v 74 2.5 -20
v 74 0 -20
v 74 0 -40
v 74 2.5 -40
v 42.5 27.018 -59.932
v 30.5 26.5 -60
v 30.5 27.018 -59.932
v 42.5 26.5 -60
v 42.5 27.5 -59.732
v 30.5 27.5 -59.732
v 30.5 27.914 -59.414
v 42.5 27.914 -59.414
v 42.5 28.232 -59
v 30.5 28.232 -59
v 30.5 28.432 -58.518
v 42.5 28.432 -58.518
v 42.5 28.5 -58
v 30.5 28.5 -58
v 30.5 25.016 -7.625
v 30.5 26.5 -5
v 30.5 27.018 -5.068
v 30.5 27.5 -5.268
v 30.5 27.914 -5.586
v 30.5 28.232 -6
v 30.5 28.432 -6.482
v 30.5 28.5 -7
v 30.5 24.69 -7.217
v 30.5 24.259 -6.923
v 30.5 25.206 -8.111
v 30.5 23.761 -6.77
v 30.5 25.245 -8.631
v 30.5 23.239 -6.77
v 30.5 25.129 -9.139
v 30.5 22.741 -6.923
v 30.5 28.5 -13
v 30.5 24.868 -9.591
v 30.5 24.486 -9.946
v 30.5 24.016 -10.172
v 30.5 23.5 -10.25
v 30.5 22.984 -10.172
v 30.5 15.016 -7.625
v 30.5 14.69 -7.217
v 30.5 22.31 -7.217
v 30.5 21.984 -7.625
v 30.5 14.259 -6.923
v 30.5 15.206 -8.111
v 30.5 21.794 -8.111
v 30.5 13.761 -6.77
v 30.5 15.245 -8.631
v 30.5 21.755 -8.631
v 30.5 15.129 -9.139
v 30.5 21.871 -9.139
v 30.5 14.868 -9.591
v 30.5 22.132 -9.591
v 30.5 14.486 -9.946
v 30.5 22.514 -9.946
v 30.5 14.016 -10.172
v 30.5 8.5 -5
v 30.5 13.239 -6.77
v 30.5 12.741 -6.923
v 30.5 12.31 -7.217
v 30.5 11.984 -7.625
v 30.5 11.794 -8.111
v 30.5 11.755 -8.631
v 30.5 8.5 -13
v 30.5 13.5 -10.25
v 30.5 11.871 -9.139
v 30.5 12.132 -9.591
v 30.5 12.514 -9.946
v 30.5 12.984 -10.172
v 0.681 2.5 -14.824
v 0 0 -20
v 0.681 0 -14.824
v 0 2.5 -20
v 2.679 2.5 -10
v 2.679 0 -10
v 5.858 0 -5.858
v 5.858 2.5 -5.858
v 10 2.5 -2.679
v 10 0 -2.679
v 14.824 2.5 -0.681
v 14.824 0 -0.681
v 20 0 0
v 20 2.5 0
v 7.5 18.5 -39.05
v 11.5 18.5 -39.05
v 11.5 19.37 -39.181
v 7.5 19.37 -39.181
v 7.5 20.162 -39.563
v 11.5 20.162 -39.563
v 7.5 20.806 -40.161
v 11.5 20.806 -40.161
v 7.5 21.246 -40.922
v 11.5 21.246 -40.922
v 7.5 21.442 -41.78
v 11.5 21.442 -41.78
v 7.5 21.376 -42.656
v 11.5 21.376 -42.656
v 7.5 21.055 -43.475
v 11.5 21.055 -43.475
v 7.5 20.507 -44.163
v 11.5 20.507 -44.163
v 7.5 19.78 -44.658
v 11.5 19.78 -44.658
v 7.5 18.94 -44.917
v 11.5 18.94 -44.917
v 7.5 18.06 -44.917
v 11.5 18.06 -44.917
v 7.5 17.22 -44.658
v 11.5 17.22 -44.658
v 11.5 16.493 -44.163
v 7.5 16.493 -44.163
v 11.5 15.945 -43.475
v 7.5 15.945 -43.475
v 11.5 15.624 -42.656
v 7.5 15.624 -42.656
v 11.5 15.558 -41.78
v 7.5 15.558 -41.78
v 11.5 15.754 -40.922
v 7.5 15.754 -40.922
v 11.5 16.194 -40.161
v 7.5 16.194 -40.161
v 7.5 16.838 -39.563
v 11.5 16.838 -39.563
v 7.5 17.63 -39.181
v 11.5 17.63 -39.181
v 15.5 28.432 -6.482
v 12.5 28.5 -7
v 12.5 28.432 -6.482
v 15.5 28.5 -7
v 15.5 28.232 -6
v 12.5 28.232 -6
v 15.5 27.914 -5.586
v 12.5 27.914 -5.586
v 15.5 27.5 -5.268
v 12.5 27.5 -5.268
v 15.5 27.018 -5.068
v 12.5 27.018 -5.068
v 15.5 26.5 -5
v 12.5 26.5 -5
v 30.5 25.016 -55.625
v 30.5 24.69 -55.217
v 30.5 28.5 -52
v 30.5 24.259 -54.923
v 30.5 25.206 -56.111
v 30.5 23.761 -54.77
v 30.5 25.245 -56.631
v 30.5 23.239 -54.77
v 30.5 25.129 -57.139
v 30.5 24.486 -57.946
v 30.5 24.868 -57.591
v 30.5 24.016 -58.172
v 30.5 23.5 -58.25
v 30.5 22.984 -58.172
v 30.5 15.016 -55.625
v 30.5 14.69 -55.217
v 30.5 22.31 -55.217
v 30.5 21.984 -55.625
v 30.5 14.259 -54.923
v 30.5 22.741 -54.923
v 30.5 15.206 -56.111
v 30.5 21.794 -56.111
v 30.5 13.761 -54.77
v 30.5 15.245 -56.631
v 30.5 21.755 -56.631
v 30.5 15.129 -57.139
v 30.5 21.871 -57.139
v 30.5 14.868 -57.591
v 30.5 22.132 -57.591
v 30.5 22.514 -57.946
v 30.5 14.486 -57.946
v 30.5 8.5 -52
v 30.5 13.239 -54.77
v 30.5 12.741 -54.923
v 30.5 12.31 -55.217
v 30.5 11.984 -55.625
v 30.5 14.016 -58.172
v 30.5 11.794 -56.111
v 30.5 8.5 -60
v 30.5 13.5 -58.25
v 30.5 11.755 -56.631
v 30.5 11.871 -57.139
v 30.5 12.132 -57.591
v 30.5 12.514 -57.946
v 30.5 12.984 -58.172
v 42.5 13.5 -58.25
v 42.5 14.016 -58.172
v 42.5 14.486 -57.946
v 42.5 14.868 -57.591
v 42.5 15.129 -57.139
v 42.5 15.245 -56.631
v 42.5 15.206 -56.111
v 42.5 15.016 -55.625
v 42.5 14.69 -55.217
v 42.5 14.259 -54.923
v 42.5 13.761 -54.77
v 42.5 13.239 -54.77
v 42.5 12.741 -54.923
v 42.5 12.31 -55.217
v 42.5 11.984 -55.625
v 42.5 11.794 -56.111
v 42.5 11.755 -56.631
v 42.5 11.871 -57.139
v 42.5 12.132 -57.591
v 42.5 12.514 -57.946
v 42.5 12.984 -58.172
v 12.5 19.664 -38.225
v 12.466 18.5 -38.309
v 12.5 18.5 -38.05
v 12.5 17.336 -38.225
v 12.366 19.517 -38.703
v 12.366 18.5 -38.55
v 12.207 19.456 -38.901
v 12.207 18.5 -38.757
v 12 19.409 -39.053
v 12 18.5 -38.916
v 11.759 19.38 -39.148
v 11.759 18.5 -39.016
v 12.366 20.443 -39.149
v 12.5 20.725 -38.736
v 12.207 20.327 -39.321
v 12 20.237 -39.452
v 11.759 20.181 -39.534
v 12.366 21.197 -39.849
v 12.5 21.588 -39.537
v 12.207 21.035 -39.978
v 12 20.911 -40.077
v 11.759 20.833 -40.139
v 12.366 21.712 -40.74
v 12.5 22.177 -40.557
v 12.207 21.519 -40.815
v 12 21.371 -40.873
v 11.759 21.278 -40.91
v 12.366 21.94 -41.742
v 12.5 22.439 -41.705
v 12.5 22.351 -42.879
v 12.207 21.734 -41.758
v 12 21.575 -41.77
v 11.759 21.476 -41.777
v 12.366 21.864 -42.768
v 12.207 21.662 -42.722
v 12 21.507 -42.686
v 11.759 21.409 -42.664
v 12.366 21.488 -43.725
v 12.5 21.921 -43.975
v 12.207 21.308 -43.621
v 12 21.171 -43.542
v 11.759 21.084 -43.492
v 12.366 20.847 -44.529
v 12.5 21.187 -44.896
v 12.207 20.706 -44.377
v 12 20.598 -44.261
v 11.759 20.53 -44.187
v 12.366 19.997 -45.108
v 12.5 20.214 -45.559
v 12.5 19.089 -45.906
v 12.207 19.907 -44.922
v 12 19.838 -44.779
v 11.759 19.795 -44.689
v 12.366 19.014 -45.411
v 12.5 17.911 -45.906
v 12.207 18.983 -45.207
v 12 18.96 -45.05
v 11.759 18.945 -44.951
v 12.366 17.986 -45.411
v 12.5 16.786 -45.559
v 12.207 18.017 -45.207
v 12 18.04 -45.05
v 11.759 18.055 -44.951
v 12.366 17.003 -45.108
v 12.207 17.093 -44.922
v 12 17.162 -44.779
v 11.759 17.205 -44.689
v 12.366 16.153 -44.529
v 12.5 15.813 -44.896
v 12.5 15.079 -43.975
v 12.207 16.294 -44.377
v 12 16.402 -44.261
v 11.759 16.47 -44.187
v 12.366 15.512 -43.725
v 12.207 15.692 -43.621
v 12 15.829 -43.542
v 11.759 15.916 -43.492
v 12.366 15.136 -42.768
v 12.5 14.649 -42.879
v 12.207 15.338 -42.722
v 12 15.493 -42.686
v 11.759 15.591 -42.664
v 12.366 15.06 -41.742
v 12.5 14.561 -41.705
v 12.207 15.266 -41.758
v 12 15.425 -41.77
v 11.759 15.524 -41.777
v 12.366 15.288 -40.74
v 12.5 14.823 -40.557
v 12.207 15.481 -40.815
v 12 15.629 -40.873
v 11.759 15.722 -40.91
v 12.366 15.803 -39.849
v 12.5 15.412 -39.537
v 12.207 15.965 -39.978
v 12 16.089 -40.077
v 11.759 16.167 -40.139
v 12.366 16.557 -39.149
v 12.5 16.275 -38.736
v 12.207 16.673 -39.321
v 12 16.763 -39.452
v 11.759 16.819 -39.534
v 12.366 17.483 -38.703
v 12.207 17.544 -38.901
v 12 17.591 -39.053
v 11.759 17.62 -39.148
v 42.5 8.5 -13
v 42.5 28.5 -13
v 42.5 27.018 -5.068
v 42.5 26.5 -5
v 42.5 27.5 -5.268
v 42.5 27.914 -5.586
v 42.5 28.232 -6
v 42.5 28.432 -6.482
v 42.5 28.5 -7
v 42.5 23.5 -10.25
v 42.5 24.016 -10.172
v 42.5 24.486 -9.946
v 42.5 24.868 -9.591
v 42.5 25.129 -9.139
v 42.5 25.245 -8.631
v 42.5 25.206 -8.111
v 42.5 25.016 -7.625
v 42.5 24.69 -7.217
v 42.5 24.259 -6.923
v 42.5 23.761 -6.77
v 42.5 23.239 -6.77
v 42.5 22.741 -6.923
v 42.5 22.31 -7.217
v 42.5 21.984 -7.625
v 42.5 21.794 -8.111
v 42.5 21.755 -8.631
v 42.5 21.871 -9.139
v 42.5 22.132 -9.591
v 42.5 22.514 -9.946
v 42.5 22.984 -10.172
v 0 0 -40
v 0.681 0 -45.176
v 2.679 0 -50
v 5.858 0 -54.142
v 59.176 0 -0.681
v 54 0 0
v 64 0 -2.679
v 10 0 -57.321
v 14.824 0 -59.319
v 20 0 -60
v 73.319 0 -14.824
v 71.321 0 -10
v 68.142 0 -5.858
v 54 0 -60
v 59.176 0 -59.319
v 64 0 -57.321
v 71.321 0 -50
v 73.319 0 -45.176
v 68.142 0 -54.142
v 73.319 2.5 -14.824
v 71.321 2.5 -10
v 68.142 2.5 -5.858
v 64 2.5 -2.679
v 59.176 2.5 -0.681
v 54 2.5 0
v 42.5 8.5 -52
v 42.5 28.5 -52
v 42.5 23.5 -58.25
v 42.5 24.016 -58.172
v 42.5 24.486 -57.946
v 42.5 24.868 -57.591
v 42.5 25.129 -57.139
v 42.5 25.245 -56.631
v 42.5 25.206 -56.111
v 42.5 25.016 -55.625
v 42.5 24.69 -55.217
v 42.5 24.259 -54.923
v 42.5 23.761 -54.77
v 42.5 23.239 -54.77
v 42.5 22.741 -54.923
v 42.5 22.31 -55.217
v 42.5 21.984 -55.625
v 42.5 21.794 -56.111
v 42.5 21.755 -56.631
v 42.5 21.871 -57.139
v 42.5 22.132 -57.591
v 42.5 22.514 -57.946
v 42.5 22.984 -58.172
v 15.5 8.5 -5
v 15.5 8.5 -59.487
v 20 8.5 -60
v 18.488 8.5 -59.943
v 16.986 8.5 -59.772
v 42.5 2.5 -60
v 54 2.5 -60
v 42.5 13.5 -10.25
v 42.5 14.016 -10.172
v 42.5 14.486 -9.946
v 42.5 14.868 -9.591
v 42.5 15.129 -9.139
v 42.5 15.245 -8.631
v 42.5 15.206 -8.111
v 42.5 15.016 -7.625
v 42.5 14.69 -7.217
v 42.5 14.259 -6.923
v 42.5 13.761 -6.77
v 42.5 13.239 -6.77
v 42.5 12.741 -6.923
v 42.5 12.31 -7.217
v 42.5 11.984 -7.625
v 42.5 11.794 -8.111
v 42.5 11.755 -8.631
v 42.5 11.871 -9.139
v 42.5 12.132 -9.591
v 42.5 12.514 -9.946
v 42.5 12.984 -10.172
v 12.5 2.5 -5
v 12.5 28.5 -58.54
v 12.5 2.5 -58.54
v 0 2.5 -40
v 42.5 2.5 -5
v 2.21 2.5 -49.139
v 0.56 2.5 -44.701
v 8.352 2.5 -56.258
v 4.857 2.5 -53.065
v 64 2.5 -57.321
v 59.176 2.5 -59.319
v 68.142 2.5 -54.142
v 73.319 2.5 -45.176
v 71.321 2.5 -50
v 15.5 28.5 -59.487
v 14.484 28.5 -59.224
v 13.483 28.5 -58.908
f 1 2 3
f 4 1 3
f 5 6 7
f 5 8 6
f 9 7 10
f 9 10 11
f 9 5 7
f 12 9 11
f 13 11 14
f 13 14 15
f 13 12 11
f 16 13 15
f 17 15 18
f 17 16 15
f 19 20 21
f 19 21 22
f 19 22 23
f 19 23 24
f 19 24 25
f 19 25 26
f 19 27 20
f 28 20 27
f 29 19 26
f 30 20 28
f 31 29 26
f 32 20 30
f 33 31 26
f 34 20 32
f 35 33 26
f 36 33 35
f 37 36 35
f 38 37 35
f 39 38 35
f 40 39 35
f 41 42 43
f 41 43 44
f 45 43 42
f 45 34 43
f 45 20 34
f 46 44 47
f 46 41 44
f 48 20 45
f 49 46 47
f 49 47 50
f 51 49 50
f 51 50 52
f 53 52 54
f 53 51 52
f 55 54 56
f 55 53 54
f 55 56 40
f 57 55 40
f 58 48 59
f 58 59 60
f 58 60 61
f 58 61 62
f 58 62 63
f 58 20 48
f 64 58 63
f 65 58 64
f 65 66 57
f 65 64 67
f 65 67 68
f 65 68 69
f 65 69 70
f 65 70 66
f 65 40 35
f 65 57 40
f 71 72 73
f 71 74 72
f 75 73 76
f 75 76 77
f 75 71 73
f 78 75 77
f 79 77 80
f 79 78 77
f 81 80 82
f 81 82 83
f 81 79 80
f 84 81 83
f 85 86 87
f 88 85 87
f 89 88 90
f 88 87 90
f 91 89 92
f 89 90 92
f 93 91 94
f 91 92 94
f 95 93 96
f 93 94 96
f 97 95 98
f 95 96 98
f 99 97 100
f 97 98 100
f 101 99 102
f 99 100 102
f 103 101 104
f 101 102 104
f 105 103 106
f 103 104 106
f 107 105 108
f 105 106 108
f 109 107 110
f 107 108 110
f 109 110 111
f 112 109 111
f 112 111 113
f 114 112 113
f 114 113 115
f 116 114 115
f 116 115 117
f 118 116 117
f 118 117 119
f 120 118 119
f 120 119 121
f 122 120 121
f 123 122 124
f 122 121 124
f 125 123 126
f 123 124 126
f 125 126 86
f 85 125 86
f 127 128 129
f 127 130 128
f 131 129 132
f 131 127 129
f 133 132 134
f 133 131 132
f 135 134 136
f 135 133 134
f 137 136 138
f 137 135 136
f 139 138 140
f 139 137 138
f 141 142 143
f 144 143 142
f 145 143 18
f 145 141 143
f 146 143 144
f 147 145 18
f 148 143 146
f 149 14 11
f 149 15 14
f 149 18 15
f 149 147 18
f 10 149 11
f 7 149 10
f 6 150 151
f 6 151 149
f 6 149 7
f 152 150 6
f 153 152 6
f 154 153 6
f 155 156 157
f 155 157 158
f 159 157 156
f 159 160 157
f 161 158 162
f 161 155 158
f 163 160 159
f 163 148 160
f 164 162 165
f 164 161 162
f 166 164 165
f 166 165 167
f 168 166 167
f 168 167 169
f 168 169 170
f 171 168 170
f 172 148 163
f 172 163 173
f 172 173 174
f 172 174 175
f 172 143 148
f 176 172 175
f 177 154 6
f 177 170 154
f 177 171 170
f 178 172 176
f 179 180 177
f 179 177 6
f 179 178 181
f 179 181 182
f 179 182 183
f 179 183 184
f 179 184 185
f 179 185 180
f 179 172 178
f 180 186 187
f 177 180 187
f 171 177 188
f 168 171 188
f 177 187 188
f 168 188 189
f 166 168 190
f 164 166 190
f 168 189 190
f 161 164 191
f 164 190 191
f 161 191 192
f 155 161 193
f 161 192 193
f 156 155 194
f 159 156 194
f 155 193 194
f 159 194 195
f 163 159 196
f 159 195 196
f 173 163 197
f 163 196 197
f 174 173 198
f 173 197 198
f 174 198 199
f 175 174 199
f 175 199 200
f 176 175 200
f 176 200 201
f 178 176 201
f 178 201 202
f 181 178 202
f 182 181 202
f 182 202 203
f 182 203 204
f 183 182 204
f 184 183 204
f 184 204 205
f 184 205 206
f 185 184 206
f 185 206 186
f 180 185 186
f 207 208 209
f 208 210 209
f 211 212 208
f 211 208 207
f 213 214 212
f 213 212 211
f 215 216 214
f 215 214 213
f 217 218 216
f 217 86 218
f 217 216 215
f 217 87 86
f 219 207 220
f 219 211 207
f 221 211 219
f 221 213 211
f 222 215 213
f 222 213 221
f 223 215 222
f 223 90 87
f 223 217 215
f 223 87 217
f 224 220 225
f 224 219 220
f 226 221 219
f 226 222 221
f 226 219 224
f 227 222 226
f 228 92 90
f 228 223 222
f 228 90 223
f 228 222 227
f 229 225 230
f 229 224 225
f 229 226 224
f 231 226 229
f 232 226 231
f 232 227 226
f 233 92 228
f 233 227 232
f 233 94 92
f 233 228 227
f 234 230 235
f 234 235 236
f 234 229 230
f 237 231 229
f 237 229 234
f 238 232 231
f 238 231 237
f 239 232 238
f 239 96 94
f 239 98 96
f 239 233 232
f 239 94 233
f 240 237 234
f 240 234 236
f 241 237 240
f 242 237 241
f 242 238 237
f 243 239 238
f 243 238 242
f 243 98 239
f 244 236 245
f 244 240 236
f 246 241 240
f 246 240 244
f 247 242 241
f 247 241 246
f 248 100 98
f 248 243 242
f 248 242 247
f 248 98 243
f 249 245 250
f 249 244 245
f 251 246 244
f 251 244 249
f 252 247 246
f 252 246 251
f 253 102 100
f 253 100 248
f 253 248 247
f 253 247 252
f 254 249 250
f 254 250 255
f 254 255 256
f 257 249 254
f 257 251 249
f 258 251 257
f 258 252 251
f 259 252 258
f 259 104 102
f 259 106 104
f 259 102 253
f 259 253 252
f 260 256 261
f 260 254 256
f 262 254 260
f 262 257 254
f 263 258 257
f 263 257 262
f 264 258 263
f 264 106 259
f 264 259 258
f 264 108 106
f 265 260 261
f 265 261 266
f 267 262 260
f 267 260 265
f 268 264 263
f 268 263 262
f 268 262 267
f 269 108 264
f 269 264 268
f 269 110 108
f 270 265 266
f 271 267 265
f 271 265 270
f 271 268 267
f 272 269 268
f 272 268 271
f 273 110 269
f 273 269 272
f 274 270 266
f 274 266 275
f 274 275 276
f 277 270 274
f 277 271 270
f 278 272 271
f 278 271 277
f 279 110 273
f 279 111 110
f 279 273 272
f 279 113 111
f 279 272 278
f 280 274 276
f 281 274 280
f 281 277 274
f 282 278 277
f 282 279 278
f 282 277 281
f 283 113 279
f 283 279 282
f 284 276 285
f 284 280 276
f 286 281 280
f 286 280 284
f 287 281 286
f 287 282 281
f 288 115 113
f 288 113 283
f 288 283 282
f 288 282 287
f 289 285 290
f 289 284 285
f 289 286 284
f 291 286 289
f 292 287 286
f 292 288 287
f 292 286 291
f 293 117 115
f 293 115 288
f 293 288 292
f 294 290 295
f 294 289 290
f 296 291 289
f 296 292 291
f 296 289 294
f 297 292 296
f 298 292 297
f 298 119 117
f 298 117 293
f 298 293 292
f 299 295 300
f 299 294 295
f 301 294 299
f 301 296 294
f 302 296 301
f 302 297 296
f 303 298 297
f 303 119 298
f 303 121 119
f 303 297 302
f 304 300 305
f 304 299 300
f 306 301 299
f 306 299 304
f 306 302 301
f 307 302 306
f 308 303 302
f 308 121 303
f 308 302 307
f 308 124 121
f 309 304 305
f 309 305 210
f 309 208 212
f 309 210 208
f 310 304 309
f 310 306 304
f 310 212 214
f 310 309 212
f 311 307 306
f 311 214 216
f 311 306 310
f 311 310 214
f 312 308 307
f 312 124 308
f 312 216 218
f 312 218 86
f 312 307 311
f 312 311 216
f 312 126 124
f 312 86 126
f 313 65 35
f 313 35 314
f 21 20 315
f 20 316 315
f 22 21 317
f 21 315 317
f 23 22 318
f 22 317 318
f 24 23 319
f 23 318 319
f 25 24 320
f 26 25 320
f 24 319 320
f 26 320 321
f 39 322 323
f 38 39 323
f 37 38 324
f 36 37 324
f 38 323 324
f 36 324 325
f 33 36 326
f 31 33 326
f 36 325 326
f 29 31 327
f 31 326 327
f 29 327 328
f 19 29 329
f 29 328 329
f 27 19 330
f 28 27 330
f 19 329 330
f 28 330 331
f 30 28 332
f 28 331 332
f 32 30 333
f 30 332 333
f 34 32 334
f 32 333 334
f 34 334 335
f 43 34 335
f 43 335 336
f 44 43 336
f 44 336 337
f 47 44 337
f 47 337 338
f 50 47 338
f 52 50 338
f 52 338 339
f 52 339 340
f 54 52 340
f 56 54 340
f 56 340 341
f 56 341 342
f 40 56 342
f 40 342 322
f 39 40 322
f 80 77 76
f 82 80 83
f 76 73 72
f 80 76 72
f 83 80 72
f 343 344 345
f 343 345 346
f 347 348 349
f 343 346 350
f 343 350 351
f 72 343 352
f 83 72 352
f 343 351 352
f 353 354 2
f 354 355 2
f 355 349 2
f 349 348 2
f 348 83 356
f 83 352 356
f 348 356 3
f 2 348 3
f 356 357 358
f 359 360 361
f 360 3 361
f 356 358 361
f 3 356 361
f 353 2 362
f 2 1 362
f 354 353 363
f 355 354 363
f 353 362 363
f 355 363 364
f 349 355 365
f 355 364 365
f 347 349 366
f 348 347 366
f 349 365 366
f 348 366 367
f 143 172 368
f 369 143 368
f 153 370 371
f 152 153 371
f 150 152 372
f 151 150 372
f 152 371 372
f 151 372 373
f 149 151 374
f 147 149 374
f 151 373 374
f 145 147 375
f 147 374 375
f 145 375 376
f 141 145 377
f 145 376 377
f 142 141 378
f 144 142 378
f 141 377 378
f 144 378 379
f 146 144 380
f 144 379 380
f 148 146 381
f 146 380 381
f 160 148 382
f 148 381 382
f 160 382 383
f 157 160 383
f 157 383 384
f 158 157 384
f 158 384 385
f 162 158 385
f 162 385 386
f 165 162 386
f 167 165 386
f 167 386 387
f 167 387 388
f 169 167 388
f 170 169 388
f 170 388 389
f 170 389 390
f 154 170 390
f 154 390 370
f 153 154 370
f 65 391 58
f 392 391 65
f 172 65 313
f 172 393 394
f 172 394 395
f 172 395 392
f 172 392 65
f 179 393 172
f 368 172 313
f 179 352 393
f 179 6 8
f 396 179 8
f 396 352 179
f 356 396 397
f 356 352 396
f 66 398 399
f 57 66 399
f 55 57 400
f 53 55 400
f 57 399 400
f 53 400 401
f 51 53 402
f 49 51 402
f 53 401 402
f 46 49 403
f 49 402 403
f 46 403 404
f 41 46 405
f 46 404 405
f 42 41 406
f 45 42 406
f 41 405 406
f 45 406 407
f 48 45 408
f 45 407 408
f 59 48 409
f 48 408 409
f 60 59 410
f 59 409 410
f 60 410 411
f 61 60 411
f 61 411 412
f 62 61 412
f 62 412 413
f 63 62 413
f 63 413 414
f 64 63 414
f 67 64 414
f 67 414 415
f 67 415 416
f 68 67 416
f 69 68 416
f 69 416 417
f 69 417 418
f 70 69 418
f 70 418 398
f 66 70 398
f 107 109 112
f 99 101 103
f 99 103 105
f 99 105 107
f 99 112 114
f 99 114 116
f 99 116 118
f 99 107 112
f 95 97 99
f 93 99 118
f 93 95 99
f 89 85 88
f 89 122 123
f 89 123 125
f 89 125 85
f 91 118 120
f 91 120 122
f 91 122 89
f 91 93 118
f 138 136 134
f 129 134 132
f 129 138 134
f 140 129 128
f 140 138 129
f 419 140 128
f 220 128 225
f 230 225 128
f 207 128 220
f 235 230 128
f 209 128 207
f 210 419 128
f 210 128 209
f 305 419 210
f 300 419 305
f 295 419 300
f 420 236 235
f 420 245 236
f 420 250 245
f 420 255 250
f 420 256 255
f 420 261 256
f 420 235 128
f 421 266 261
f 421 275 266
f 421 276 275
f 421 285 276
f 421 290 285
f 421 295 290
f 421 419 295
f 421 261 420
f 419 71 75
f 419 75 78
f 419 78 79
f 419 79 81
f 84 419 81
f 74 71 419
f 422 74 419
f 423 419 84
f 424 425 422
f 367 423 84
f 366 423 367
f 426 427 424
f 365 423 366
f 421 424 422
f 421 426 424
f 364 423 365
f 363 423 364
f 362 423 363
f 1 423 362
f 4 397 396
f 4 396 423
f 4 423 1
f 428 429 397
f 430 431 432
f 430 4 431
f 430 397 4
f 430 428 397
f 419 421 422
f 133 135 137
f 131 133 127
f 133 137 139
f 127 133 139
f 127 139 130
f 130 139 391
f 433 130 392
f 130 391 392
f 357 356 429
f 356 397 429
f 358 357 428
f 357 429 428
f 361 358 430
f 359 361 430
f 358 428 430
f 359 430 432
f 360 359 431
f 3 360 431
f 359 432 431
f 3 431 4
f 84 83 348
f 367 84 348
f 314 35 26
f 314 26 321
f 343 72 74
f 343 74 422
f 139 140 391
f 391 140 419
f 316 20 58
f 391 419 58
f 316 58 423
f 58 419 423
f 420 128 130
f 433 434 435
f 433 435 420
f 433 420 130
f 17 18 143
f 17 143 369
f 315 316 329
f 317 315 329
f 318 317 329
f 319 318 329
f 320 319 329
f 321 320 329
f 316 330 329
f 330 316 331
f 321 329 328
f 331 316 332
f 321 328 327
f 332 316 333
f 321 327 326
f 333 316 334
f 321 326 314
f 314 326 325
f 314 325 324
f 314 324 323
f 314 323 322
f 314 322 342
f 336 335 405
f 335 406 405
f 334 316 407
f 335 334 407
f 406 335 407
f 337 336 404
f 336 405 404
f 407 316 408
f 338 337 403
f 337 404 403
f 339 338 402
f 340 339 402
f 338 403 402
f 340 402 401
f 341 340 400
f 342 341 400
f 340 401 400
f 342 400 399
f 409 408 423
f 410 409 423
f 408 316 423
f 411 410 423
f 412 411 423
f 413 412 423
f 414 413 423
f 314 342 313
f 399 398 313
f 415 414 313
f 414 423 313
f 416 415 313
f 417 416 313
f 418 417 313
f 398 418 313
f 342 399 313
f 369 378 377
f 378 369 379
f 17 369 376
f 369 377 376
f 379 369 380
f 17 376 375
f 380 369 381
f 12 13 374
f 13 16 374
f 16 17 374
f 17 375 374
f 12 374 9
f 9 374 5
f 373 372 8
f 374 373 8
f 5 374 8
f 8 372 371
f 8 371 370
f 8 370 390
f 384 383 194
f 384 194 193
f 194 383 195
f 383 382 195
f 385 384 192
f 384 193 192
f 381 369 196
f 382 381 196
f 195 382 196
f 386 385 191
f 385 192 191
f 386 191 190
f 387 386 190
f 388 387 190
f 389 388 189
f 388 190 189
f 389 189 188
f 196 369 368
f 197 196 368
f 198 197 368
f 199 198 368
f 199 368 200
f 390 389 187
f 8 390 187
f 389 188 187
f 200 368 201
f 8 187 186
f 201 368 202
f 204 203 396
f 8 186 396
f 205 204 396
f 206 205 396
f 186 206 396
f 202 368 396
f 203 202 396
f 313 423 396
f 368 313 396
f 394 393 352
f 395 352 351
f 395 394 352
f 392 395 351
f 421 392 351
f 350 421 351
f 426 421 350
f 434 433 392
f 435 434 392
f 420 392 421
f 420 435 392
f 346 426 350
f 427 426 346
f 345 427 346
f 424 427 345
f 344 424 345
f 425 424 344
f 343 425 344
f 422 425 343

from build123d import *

# Parameters (mm, degrees)
ESQUISSE1_W             = 74
ESQUISSE1_H             = 60
BOSS_EXTRU_1_DEPTH      = 2.5
ESQUISSE2_W             = 30
ESQUISSE2_H             = 55
BOSS_EXTRU_2_DEPTH      = 6
ESQUISSE4_W             = 12
ESQUISSE4_H             = 8
BOSS_EXTRU_3_DEPTH      = 20
ESQUISSE5_R             = 1.75
ENL_V_MAT_EXTRU_1_DEPTH = 20
ESQUISSE6_R             = 2.95
BOSS_EXTRU_4_DEPTH      = 5
CONG_1_R                = 1
CONG_2_R                = 20
CONG_3_R                = 2


with BuildPart() as part:
    # Esquisse1 → Boss.-Extru.1 (new body)
    with BuildSketch(Plane(origin=(0, 0, 0), x_dir=(1, 0, 0), z_dir=(0, 1, 0))):
        with Locations((37, 30)):
            Rectangle(ESQUISSE1_W, ESQUISSE1_H)
    extrude(amount=BOSS_EXTRU_1_DEPTH)

    # Esquisse2 → Boss.-Extru.2 (add)
    with BuildSketch(Plane(origin=(0, 2.5, 0), x_dir=(1, 0, 0), z_dir=(0, 1, 0))):
        with Locations((27.5, 32.5)):
            Rectangle(ESQUISSE2_W, ESQUISSE2_H)
    extrude(amount=BOSS_EXTRU_2_DEPTH)

    # Esquisse4 → Boss.-Extru.3 (add)
    with BuildSketch(Plane(origin=(0, 8.5, 0), x_dir=(1, 0, 0), z_dir=(0, 1, 0))):
        with Locations((36.5, 56)):
            Rectangle(ESQUISSE4_W, ESQUISSE4_H)
        Polygon((12.5, 60), (12.5, 52), (12.5, 13), (12.5, 5), (15.5, 5), (15.5, 13), (15.5, 52), (15.5, 60), align=None)
        with Locations((36.5, 9)):
            Rectangle(ESQUISSE4_W, ESQUISSE4_H)
    extrude(amount=BOSS_EXTRU_3_DEPTH)

    # Esquisse5 → Enlèv. mat.-Extru.1 (cut)
    with BuildSketch(Plane(origin=(42.5, 0, 0), x_dir=(0, 0, -1), z_dir=(1, 0, 0))):
        with Locations((8.5, 23.5)):
            Circle(ESQUISSE5_R)
        with Locations((8.5, 13.5)):
            Circle(ESQUISSE5_R)
        with Locations((56.5, 23.5)):
            Circle(ESQUISSE5_R)
        with Locations((56.5, 13.5)):
            Circle(ESQUISSE5_R)
    extrude(amount=-ENL_V_MAT_EXTRU_1_DEPTH, mode=Mode.SUBTRACT)

    # Esquisse6 → Boss.-Extru.4 (add)
    with BuildSketch(Plane.ZY.offset(-12.5)):
        with Locations((-42, 18.5)):
            Circle(ESQUISSE6_R)
    extrude(amount=BOSS_EXTRU_4_DEPTH)

    # Congé1
    cong_1_edges = [part.edges().sort_by_distance(p)[0] for p in [
        (12.5, 18.5, -44.95),
    ]]
    fillet(cong_1_edges, radius=CONG_1_R)

    # Congé2
    cong_2_edges = [part.edges().sort_by_distance(p)[0] for p in [
        (74, 1.25, -60),
        (74, 1.25, 0),
        (0, 1.25, 0),
        (0, 1.25, -60),
    ]]
    fillet(cong_2_edges, radius=CONG_2_R)

    # Congé3
    cong_3_edges = [part.edges().sort_by_distance(p)[0] for p in [
        (36.5, 28.5, -60),
        (14, 28.5, -5),
        (36.5, 28.5, -5),
    ]]
    fillet(cong_3_edges, radius=CONG_3_R)


solid = part.part
